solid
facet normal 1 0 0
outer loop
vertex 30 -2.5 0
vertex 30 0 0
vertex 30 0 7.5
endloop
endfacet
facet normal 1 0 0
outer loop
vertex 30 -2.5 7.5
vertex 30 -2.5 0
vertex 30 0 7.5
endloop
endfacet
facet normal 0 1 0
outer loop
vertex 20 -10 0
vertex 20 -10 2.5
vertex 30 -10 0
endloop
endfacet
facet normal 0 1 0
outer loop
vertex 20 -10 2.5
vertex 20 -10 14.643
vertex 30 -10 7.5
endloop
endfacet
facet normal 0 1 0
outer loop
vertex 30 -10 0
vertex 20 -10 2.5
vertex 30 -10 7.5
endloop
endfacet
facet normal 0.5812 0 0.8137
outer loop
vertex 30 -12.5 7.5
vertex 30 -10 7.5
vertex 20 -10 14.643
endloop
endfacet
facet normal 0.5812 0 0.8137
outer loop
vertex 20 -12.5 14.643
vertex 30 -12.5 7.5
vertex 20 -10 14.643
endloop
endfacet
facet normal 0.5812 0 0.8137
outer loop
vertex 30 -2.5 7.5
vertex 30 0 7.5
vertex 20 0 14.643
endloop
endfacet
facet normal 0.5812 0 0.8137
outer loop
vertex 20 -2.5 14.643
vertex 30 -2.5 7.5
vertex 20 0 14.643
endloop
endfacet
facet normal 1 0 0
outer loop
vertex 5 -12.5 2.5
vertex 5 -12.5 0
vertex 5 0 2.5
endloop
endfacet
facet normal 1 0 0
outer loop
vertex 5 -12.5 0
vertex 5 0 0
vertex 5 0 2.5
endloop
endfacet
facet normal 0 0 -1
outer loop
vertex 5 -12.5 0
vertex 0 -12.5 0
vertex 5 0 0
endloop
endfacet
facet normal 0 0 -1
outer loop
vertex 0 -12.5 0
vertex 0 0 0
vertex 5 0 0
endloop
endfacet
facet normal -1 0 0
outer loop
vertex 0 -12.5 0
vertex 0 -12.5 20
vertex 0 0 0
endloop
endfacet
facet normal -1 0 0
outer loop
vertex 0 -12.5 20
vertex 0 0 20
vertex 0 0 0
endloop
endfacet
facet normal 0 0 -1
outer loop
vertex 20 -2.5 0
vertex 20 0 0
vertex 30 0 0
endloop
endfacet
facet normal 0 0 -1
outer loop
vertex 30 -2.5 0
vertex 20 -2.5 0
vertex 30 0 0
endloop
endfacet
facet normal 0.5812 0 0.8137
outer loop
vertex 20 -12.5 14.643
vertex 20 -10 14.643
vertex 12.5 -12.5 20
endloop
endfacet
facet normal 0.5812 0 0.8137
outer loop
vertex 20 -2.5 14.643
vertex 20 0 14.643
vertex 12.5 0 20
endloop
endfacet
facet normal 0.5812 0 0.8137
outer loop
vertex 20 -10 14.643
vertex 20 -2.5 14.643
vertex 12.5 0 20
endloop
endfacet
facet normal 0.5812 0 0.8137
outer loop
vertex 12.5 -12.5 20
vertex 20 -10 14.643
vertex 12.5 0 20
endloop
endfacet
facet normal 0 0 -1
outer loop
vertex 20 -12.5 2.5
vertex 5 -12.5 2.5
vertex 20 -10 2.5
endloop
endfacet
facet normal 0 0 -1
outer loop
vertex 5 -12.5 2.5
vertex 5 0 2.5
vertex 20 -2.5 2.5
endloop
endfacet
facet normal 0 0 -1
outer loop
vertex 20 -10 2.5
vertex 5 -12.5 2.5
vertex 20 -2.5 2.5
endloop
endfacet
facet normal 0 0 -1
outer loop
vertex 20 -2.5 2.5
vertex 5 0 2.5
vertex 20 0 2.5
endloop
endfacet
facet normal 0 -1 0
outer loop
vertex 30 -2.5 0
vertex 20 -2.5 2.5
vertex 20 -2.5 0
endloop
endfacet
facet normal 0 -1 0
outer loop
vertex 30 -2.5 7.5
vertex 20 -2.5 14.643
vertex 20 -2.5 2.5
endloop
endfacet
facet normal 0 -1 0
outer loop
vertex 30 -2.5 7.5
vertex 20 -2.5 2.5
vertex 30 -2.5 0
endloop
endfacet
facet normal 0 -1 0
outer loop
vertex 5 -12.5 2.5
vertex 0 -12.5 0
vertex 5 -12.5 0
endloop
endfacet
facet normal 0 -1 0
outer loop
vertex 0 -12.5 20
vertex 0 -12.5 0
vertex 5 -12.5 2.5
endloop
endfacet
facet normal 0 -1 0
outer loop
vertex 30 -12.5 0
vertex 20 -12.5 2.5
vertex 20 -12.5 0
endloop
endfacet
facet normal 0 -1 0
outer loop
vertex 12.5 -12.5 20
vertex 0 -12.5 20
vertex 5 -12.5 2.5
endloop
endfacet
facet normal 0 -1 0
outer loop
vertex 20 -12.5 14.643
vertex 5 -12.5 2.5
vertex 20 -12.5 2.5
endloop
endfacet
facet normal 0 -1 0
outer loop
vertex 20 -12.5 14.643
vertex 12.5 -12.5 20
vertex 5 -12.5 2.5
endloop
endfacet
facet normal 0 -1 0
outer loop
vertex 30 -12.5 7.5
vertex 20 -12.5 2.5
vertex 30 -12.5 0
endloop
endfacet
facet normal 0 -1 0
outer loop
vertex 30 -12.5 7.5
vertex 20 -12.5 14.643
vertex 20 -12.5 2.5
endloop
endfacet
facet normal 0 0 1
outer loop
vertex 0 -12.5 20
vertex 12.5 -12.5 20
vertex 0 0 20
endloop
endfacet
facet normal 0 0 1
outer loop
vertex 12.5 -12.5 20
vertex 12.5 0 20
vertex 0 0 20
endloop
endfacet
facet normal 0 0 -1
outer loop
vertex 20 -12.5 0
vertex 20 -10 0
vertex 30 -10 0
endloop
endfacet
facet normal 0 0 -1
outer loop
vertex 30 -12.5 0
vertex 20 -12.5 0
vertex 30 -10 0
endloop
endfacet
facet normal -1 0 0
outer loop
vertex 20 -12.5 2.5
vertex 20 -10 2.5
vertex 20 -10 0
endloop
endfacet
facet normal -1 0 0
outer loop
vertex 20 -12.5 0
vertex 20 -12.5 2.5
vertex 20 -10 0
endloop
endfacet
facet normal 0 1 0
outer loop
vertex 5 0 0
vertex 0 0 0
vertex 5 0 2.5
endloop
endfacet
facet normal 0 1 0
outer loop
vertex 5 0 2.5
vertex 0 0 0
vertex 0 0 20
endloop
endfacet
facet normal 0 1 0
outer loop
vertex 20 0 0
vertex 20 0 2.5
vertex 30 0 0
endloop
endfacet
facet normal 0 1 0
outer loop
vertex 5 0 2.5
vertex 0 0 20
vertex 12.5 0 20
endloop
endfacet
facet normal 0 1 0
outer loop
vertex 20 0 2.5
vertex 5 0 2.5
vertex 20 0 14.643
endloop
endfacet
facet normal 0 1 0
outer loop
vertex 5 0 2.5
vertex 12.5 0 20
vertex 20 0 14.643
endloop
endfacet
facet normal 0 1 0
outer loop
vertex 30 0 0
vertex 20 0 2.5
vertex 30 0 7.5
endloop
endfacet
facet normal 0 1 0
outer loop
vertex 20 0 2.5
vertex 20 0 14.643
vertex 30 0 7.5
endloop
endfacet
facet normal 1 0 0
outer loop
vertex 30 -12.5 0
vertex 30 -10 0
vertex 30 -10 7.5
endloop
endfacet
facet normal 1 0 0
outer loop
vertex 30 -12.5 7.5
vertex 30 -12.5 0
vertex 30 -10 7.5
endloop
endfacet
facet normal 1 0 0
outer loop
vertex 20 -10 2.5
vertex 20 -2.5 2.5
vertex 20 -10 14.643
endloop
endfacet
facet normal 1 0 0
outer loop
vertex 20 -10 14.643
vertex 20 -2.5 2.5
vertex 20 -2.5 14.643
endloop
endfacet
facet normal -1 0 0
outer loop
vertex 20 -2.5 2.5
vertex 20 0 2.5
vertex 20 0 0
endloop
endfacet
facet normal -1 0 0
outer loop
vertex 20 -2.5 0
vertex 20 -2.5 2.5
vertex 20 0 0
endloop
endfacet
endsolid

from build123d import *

# Parameters (mm, degrees)
F1_DEPTH = 2.5
F2_DEPTH = 10
F4_DEPTH = 2.5


with BuildPart() as f1:
    # F0 (on Front) → F1 (new body)
    with BuildSketch(Plane.XZ):
        Polygon((0, 20), (0, 0), (5, 0), (5, 2.5), (20, 2.5), (20, 14.6428571429), (12.5, 20), align=None)
        Polygon((30, 7.5), (20, 14.6428571429), (20, 2.5), (20, 0), (30, 0), align=None)
    extrude(amount=F1_DEPTH)

    # F0 (on Front) → F2 (join)
    with BuildSketch(Plane.XZ):
        Polygon((0, 20), (0, 0), (5, 0), (5, 2.5), (20, 2.5), (20, 14.6428571429), (12.5, 20), align=None)
    extrude(amount=F2_DEPTH)

    # F3 (on face) → F4 (join)
    with BuildSketch(Plane.XZ.offset(10)):
        Polygon((20, 2.5), (20, 14.6428571429), (12.5, 20), (0, 20), (0, 0), (5, 0), (5, 2.5), align=None)
        Polygon((30, 7.5), (20, 14.6428571429), (20, 2.5), (20, 0), (30, 0), align=None)
    extrude(amount=F4_DEPTH)


solid = f1.part
